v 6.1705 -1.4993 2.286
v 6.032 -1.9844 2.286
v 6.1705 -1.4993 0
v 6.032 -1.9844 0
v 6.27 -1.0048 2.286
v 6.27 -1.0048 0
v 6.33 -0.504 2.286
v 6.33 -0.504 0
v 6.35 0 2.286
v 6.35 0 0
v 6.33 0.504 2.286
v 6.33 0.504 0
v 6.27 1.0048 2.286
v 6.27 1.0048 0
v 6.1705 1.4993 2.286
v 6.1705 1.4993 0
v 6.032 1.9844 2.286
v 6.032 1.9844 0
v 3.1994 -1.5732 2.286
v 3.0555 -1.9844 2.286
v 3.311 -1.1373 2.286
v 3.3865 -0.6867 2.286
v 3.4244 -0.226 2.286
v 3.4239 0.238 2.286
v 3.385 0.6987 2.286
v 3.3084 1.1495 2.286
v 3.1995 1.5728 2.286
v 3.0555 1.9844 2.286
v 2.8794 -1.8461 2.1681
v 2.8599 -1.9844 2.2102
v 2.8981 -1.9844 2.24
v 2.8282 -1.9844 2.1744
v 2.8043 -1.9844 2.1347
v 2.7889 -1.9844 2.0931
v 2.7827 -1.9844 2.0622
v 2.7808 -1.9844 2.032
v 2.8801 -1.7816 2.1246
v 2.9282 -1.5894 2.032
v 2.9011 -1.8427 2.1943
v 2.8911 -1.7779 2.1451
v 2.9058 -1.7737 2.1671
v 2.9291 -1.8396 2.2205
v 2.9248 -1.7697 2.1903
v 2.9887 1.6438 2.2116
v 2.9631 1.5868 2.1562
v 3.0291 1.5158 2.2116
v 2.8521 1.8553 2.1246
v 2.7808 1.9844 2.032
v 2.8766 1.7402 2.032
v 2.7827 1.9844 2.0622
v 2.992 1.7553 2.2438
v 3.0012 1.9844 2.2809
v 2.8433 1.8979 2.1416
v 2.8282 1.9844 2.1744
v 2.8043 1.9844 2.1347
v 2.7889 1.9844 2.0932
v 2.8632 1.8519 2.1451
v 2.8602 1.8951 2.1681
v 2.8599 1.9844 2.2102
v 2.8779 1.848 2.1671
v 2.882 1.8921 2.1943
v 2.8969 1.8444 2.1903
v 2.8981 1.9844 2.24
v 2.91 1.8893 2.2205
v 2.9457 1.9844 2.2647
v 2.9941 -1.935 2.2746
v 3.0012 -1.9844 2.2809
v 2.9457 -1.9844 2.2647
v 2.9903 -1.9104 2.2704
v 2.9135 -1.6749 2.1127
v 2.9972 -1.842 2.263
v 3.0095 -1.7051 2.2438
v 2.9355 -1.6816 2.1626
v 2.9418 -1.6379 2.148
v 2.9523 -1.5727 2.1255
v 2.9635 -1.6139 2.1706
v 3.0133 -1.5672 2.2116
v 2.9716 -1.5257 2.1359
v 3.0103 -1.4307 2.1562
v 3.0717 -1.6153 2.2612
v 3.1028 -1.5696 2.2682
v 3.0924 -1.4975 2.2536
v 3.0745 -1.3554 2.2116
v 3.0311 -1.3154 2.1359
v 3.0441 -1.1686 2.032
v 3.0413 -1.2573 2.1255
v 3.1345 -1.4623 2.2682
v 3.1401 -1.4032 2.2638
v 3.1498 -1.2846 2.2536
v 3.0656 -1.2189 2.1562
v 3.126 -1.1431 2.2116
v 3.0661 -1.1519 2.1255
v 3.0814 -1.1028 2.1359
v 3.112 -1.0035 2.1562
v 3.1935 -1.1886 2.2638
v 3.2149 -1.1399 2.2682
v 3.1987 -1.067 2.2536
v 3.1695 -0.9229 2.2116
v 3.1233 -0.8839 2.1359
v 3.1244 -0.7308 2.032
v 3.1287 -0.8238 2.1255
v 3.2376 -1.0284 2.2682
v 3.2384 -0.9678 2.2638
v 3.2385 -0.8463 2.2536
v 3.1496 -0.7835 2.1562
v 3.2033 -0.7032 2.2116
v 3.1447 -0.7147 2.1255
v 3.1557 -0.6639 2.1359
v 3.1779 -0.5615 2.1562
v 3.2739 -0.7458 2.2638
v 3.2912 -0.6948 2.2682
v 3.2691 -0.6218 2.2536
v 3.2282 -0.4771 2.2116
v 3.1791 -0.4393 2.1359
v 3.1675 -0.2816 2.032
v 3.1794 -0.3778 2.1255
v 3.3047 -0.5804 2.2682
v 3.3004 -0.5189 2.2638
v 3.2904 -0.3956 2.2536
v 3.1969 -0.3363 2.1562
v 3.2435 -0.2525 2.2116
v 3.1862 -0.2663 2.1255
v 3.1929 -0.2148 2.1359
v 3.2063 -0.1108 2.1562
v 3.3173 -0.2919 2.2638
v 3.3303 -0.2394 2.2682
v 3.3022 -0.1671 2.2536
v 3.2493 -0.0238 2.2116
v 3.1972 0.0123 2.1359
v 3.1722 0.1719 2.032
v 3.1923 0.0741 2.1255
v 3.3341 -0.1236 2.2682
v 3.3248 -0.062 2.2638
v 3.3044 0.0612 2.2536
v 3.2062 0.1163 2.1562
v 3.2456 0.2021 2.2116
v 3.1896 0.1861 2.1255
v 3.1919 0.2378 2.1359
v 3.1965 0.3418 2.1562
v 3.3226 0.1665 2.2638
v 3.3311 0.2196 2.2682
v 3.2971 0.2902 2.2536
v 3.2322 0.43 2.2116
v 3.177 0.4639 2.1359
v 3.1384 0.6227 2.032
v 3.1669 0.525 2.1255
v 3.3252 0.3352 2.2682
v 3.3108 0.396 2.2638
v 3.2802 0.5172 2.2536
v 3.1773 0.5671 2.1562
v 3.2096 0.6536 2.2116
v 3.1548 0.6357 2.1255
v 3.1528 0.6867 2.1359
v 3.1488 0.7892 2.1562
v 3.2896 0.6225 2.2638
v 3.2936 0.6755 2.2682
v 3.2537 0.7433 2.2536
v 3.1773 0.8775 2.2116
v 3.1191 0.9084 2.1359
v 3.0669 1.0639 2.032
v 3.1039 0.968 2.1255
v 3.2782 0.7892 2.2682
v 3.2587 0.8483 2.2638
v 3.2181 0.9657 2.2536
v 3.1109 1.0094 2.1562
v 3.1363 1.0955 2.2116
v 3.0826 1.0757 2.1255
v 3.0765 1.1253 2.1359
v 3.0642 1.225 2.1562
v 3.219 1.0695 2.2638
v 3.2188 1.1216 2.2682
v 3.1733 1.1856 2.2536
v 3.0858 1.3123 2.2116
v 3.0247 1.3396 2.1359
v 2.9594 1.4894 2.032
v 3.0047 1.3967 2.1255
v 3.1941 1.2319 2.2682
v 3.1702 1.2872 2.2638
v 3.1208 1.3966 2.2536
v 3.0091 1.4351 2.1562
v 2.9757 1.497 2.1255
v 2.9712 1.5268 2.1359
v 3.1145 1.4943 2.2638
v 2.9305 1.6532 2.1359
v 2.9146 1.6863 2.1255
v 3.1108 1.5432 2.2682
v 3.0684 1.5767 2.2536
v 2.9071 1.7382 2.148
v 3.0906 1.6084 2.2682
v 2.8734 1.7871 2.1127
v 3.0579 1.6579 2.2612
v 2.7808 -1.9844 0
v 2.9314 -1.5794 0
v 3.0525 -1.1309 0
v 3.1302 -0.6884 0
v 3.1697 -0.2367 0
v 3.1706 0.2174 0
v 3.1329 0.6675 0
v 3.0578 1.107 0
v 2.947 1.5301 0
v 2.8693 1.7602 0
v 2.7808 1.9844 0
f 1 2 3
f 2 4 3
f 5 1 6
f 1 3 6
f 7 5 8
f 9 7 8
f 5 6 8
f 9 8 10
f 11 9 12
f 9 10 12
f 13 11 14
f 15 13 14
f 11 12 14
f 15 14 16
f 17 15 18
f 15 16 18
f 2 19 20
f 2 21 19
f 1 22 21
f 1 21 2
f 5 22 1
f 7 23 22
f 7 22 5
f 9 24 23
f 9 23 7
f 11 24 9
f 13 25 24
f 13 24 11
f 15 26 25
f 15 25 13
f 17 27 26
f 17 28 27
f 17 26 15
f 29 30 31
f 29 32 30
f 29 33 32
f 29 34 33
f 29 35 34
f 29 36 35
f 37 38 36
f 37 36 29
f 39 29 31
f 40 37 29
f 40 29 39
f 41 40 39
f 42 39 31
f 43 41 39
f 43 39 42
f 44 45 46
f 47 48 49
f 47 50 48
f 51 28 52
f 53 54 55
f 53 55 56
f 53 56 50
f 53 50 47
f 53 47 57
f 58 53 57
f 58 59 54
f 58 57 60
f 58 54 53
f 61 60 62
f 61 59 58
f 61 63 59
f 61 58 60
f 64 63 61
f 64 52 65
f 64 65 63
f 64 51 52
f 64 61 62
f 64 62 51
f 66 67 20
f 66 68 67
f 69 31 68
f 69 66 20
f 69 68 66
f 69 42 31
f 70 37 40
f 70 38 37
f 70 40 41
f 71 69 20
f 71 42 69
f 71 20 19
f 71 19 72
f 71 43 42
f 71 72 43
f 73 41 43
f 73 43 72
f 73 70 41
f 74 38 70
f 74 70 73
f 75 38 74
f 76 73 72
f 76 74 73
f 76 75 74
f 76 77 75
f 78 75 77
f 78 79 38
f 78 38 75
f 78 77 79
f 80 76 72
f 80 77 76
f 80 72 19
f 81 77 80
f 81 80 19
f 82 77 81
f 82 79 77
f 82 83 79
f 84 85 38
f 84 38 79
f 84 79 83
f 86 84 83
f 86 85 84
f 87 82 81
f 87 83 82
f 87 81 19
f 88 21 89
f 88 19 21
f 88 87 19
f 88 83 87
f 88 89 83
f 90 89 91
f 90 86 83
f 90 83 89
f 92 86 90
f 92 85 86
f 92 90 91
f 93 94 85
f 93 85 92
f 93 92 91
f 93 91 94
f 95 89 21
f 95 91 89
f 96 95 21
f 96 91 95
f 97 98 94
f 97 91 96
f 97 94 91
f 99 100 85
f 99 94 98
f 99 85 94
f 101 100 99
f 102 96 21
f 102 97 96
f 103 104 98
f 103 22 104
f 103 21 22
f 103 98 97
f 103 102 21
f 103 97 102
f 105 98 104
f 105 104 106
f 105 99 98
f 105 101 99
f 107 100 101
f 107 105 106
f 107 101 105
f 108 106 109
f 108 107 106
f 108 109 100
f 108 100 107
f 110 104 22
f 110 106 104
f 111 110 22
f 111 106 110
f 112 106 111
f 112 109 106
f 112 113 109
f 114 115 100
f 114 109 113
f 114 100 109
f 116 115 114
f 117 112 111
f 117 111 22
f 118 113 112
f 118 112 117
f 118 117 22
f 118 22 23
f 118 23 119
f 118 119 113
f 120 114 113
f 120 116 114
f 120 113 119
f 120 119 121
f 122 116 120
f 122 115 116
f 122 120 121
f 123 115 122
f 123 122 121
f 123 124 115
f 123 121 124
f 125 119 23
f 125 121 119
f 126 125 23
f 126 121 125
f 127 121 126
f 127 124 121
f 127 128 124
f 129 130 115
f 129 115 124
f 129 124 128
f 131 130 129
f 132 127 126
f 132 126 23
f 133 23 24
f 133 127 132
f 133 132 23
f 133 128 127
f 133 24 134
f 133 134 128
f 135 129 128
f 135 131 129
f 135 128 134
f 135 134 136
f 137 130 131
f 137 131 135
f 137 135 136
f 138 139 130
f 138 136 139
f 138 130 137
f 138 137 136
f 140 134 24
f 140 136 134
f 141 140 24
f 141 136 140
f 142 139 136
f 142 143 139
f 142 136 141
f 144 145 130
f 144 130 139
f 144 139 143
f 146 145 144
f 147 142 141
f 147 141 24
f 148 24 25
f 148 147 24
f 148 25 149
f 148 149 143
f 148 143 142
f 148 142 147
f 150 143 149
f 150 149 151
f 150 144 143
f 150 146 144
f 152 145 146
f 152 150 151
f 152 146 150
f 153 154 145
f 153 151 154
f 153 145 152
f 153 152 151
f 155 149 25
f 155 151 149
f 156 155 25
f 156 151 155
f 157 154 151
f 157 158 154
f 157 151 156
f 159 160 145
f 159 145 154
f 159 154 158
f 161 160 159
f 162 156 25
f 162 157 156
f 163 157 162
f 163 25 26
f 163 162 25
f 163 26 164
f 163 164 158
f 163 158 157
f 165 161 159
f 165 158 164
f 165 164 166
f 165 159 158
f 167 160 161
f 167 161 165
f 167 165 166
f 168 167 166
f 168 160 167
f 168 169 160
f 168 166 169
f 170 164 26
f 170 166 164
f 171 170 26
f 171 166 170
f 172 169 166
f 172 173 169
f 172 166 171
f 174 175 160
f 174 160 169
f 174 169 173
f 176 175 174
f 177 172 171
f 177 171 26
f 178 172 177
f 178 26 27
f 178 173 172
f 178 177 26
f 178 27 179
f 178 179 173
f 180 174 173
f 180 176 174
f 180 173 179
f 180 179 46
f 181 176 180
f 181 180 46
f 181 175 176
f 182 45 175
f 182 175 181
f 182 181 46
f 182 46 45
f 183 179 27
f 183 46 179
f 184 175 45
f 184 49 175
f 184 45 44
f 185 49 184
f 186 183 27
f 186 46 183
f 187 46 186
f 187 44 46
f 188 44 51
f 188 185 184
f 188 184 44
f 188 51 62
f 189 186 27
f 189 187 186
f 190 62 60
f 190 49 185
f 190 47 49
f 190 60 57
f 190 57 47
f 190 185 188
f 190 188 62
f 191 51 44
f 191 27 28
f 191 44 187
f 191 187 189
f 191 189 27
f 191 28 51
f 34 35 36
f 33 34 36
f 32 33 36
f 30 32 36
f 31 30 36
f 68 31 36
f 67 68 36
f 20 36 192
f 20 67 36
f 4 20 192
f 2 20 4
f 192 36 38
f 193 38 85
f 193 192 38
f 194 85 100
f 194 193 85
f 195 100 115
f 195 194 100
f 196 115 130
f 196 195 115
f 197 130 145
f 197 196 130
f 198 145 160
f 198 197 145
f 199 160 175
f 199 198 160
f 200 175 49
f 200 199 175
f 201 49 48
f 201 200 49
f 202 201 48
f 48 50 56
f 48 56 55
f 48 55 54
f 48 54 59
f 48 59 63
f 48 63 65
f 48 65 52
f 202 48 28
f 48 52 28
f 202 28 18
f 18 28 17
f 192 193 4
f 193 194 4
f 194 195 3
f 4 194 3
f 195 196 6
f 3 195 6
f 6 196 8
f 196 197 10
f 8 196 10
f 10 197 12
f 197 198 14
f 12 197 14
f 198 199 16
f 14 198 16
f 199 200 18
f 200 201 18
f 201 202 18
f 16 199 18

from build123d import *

# Parameters (mm, degrees)
F0_R     = 6.35
F1_DEPTH = 2.286
F2_R     = 0.254
F3_W     = 8.3312
F3_H     = 3.96875
F4_DEPTH = 2.286


with BuildPart() as f1:
    # F0 (on Top) → F1 (new body)
    with BuildSketch(Plane.XY):
        Circle(F0_R)
        with BuildLine():
            add(Edge.make_bspline(
                [(0, 4.111625), (-5.499261, 4.111625), (-2.749631, -2.055812), (0, -8.22325), (2.749631, -2.055813), (5.499261, 4.111625), (0, 4.111625)],
                knots=[0, 0, 0, 2.094395, 2.094395, 4.18879, 4.18879, 6.283185, 6.283185, 6.283185], degree=2, weights=[1, 0.5, 1, 0.5, 1, 0.5, 1]))
        make_face(mode=Mode.SUBTRACT)
    extrude(amount=F1_DEPTH)

    # F2
    f2_edges = [f1.edges().sort_by_distance(p)[0] for p in [
        (0, -4.111625, 2.286),
    ]]
    fillet(f2_edges, radius=F2_R)

    # F3 (on face) → F4 (intersect)
    with BuildSketch(Plane.XY.offset(2.286)):
        with Locations((2.837246, 0)):
            Rectangle(F3_W, F3_H)
    extrude(amount=-F4_DEPTH, mode=Mode.INTERSECT)


solid = f1.part
